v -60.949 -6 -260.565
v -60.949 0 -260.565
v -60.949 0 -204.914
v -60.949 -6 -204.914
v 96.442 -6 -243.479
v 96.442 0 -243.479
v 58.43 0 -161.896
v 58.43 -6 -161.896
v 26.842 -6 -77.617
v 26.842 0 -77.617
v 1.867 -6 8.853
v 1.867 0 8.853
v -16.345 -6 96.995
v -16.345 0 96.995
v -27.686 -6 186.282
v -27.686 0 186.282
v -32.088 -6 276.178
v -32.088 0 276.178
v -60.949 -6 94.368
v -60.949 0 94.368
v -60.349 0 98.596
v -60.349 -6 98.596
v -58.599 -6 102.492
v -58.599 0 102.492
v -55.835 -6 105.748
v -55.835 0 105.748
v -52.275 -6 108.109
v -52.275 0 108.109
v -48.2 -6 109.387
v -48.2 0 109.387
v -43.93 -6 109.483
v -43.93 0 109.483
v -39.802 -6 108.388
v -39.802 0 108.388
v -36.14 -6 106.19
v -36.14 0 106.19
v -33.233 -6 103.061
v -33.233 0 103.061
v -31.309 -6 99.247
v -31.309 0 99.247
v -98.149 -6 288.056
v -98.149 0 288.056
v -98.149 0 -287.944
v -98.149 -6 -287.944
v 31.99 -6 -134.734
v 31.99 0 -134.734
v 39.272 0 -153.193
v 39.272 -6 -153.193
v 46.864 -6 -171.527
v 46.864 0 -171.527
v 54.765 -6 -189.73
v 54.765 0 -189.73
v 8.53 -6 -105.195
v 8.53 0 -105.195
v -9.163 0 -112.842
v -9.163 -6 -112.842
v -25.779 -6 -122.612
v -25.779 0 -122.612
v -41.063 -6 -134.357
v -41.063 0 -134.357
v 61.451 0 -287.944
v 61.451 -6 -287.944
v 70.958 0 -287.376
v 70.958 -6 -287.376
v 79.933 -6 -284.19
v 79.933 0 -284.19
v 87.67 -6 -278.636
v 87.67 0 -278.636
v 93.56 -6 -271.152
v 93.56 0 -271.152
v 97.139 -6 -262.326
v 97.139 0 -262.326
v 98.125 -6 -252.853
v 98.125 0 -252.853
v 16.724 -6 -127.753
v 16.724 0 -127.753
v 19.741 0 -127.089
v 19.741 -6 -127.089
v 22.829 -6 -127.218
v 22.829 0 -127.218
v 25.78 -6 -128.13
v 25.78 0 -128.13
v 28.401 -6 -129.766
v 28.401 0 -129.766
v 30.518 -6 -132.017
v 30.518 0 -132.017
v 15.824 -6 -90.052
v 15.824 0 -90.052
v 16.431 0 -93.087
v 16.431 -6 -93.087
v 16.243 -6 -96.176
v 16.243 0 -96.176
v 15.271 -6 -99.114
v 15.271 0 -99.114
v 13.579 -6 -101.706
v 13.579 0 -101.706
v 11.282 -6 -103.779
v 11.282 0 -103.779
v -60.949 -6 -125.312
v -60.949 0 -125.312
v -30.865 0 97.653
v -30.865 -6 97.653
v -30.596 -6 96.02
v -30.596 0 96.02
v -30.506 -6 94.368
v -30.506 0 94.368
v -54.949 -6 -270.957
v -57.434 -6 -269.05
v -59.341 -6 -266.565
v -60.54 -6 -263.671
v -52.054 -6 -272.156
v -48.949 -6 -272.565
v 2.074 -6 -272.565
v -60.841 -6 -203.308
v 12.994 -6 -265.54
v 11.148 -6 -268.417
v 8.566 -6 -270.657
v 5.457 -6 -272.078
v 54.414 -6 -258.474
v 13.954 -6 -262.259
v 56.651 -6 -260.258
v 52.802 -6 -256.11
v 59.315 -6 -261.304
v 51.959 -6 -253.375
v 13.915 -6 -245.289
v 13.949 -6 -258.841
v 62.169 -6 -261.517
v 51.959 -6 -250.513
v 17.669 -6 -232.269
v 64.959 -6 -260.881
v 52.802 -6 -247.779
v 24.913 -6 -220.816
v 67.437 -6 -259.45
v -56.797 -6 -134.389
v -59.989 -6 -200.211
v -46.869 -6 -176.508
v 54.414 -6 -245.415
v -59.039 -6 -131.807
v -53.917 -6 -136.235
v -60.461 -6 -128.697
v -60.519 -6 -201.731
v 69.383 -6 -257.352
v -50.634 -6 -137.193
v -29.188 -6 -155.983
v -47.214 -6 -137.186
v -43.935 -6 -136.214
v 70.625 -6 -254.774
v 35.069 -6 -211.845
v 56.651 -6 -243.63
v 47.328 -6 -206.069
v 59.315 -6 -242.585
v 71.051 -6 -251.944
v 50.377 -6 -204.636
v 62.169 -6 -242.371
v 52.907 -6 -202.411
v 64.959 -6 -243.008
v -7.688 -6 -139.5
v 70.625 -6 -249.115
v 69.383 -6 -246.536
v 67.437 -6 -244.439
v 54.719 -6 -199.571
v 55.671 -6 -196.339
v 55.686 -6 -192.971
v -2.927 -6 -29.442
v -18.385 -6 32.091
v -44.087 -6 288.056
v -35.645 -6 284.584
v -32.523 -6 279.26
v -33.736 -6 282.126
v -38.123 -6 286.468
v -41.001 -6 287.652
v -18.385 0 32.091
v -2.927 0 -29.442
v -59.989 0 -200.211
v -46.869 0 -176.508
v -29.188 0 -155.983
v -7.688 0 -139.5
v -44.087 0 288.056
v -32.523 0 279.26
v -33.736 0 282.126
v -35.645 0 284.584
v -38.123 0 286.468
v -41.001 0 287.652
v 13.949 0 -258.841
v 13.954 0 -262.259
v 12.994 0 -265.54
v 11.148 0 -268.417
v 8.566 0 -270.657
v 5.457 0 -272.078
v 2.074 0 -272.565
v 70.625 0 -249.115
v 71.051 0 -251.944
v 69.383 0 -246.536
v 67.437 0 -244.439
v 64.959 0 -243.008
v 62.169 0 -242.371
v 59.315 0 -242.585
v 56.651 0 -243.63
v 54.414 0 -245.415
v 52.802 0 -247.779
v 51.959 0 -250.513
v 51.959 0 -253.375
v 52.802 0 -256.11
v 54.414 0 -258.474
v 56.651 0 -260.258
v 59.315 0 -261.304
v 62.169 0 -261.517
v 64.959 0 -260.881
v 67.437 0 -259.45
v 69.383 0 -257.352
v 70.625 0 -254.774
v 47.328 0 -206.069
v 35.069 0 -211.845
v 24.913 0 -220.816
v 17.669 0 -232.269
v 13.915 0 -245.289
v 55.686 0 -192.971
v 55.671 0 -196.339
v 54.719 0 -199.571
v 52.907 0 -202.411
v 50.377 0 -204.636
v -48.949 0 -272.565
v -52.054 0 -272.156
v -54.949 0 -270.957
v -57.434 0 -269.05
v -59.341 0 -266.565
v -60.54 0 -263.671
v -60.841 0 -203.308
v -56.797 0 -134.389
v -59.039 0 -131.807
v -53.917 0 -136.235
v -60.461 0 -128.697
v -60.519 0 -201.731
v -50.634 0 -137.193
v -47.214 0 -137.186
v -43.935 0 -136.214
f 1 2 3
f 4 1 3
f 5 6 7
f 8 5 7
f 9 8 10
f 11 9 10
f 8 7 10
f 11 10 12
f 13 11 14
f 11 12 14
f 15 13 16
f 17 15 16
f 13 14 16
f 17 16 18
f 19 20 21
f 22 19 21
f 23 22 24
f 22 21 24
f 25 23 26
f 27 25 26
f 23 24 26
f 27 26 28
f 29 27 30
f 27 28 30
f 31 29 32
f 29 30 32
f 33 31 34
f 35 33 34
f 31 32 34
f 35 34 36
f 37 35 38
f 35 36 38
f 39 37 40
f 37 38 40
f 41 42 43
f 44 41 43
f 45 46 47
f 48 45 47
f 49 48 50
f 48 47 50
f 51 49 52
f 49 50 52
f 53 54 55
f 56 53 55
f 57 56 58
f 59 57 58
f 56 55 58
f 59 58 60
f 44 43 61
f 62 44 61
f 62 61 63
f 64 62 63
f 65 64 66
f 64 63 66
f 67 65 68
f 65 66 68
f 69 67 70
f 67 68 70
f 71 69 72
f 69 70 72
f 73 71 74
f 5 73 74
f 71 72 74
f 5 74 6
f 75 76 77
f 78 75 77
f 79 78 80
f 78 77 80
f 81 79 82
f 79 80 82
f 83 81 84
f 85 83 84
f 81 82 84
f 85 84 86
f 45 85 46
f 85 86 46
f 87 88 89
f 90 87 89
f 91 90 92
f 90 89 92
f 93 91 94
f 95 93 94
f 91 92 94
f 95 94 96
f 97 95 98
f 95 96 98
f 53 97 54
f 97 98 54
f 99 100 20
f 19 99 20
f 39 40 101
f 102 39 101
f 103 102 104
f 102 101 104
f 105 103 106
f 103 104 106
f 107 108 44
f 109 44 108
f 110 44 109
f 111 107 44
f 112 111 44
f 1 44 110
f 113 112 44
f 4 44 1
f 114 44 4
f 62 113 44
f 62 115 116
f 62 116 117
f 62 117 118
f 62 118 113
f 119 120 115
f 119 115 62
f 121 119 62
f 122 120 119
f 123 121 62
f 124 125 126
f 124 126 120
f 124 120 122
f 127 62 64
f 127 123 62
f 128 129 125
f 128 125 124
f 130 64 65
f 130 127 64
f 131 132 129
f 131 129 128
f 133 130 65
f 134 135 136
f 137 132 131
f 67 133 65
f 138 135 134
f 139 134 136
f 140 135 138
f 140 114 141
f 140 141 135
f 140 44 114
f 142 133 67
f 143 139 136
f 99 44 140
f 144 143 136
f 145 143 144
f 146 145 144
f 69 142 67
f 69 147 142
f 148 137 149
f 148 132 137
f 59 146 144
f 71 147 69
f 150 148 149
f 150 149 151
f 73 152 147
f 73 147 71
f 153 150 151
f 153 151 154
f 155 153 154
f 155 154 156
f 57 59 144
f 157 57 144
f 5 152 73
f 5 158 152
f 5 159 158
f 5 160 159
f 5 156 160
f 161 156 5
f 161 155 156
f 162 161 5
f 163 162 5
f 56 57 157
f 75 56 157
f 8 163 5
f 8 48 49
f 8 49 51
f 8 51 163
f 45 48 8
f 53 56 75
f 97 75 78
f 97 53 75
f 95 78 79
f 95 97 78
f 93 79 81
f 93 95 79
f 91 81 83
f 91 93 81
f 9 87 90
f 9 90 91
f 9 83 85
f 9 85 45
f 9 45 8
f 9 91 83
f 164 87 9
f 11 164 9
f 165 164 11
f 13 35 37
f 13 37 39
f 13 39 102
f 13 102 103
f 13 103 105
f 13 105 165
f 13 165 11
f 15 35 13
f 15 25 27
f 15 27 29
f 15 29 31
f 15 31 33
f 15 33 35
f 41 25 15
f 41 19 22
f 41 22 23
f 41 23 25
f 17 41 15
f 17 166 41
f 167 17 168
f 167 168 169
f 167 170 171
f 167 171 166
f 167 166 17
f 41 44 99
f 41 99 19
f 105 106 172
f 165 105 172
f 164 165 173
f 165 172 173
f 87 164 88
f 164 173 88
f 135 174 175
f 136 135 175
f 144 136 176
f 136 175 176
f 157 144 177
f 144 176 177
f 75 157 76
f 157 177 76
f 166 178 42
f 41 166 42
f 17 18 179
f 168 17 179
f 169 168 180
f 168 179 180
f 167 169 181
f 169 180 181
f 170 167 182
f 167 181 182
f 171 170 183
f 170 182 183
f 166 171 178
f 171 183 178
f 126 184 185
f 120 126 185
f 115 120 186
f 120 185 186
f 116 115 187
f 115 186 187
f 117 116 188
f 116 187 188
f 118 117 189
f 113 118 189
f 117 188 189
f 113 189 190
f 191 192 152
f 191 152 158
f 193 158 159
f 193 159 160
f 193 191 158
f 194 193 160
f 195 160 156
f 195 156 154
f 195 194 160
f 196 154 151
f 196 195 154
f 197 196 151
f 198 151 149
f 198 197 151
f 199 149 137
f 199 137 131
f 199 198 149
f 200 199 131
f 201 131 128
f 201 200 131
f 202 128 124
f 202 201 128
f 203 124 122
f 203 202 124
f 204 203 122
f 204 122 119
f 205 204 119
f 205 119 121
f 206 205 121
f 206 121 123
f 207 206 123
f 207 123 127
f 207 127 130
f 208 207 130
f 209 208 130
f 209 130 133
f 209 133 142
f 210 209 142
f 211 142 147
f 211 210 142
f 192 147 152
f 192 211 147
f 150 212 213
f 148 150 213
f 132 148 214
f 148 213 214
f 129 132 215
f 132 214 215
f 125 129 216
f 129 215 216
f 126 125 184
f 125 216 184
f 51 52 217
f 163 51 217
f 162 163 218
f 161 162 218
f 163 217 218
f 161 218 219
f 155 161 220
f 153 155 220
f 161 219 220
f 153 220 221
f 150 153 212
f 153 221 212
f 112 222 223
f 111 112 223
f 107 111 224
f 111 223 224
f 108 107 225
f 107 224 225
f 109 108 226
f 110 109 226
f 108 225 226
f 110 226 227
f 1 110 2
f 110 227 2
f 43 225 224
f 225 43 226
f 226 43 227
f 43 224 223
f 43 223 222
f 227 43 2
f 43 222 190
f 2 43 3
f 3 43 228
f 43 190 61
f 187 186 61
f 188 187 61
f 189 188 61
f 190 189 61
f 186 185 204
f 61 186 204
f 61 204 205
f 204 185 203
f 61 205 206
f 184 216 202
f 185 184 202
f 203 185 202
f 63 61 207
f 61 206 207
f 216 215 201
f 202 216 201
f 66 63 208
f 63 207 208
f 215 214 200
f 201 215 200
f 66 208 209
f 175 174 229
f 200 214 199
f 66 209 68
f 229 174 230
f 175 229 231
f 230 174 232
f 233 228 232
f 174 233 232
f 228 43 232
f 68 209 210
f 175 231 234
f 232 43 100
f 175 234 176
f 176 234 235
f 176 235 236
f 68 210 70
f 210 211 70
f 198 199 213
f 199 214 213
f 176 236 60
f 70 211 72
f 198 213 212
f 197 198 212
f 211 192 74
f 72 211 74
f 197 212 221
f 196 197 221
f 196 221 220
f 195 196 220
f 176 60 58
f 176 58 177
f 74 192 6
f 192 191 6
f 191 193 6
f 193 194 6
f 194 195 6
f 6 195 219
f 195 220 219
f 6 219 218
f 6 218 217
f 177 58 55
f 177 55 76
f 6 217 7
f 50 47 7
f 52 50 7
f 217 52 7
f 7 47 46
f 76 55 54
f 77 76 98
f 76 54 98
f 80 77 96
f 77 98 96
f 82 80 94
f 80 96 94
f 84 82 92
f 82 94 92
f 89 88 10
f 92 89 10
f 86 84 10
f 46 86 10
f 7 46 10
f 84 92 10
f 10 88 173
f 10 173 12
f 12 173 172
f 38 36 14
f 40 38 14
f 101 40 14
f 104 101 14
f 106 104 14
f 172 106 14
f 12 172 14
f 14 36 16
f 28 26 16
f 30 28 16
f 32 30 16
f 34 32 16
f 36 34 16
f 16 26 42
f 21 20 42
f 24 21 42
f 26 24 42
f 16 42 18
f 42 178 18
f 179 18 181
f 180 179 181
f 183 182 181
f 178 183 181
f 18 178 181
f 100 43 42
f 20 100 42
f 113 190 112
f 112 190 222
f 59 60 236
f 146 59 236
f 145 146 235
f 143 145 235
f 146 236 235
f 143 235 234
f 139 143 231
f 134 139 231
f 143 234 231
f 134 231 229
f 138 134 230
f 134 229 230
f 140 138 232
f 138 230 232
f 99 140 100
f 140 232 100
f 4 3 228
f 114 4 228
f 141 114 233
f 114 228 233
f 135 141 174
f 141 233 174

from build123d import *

# Parameters (mm, degrees)
F0_R     = 9.6
F1_DEPTH = 6


# Not quite as in the source:
# - ends of sketch curves that miss each other by under 0.0002 mm in the source are joined


with BuildPart() as f1:
    # F0 (on Front) → F1 (new body)
    with BuildSketch(Plane.XZ):
        with BuildLine():
            Line((-98.148557, 288.055726), (-98.148557, -287.944274))
            Line((-98.148557, -287.944274), (61.451443, -287.944274))
            ThreePointArc((61.451443, -287.944274), (90.8786929022, -275.1012880869), (96.4420569386, -243.4792343499))
            ThreePointArc((96.4420569386, -243.4792343499), (1.8673791595, 8.8528531517), (-32.087896312, 276.178294007))
            ThreePointArc((-32.087896312, 276.178294007), (-35.6454351808, 284.5842316136), (-44.087271, 288.055726))
            Line((-44.087271, 288.055726), (-98.148557, 288.055726))
        make_face()
        with BuildLine():
            ThreePointArc((-59.9885571325, -200.2110509435), (-29.1876571231, -155.9830655412), (16.7239738658, -127.7530766274))
            ThreePointArc((16.7239738658, -127.7530766274), (25.780399848, -128.1300293864), (31.9895542757, -134.7336148939))
            ThreePointArc((31.9895542757, -134.7336148939), (43.0295184538, -162.3758186302), (54.7647919037, -189.7300795987))
            ThreePointArc((54.7647919037, -189.7300795987), (54.7194507021, -199.5712496832), (47.3282871338, -206.0690474345))
            ThreePointArc((47.3282871338, -206.0690474345), (20.885121351, -226.2854831503), (13.9494494618, -258.8406940781))
            ThreePointArc((13.9494494618, -258.8406940781), (11.1483451659, -268.4168923847), (2.073951, -272.564799))
            Line((2.073951, -272.564799), (-48.948557, -272.564799))
            ThreePointArc((-48.948557, -272.564799), (-57.4338383742, -269.0500803742), (-60.948557, -260.564799))
            Line((-60.948557, -260.564799), (-60.948557, -204.914071))
            ThreePointArc((-60.948557, -204.914071), (-60.7061077935, -202.514071138), (-59.9885571325, -200.2110509435))
        make_face(mode=Mode.SUBTRACT)
        with BuildLine():
            ThreePointArc((-31.3094104055, 99.2474937685), (-30.7081992917, 96.8404508863), (-30.506005, 94.367714))
            ThreePointArc((-30.506005, 94.367714), (-11.0707369719, 1.2206915156), (15.8236014105, -90.0524808608))
            ThreePointArc((15.8236014105, -90.0524808608), (15.2706893662, -99.1138555668), (8.5302342503, -105.1950136941))
            ThreePointArc((8.5302342503, -105.1950136941), (-17.6222584193, -117.4699279564), (-41.0628425771, -134.3567693381))
            ThreePointArc((-41.0628425771, -134.3567693381), (-53.9170288848, -136.2346849428), (-60.948557, -125.311577))
            Line((-60.948557, -125.311577), (-60.948557, 94.367714))
            ThreePointArc((-60.948557, 94.367714), (-48.2000178863, 109.3867957083), (-31.3094104055, 99.2474937685))
        make_face(mode=Mode.SUBTRACT)
        with Locations((61.451443, -251.944274)):
            Circle(F0_R, mode=Mode.SUBTRACT)
    extrude(amount=F1_DEPTH)


solid = f1.part
